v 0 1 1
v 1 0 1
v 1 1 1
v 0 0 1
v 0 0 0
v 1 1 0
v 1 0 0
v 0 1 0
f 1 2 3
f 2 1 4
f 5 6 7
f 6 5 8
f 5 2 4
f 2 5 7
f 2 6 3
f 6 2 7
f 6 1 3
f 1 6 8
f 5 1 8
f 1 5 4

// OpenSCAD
//<skip>
// F=forward, -/+=yaw, ^/&=pitch, </>=roll, [/]=push/pop
rules = [["A", "^F[^^F>>>>>>A]>>>[^^F>>>>>>A]>>>>>[^^F>>>>>>A]"]];
axiom = "FA";
forward = 5;
angle = 15;
iterations = 5;

module dummy() {};


//<skip>
//rotate([0,-90,0]) drawLSystem(rules,axiom,iterations,functions) sphere(1,$fn=4);
//</skip>
cube(1);
